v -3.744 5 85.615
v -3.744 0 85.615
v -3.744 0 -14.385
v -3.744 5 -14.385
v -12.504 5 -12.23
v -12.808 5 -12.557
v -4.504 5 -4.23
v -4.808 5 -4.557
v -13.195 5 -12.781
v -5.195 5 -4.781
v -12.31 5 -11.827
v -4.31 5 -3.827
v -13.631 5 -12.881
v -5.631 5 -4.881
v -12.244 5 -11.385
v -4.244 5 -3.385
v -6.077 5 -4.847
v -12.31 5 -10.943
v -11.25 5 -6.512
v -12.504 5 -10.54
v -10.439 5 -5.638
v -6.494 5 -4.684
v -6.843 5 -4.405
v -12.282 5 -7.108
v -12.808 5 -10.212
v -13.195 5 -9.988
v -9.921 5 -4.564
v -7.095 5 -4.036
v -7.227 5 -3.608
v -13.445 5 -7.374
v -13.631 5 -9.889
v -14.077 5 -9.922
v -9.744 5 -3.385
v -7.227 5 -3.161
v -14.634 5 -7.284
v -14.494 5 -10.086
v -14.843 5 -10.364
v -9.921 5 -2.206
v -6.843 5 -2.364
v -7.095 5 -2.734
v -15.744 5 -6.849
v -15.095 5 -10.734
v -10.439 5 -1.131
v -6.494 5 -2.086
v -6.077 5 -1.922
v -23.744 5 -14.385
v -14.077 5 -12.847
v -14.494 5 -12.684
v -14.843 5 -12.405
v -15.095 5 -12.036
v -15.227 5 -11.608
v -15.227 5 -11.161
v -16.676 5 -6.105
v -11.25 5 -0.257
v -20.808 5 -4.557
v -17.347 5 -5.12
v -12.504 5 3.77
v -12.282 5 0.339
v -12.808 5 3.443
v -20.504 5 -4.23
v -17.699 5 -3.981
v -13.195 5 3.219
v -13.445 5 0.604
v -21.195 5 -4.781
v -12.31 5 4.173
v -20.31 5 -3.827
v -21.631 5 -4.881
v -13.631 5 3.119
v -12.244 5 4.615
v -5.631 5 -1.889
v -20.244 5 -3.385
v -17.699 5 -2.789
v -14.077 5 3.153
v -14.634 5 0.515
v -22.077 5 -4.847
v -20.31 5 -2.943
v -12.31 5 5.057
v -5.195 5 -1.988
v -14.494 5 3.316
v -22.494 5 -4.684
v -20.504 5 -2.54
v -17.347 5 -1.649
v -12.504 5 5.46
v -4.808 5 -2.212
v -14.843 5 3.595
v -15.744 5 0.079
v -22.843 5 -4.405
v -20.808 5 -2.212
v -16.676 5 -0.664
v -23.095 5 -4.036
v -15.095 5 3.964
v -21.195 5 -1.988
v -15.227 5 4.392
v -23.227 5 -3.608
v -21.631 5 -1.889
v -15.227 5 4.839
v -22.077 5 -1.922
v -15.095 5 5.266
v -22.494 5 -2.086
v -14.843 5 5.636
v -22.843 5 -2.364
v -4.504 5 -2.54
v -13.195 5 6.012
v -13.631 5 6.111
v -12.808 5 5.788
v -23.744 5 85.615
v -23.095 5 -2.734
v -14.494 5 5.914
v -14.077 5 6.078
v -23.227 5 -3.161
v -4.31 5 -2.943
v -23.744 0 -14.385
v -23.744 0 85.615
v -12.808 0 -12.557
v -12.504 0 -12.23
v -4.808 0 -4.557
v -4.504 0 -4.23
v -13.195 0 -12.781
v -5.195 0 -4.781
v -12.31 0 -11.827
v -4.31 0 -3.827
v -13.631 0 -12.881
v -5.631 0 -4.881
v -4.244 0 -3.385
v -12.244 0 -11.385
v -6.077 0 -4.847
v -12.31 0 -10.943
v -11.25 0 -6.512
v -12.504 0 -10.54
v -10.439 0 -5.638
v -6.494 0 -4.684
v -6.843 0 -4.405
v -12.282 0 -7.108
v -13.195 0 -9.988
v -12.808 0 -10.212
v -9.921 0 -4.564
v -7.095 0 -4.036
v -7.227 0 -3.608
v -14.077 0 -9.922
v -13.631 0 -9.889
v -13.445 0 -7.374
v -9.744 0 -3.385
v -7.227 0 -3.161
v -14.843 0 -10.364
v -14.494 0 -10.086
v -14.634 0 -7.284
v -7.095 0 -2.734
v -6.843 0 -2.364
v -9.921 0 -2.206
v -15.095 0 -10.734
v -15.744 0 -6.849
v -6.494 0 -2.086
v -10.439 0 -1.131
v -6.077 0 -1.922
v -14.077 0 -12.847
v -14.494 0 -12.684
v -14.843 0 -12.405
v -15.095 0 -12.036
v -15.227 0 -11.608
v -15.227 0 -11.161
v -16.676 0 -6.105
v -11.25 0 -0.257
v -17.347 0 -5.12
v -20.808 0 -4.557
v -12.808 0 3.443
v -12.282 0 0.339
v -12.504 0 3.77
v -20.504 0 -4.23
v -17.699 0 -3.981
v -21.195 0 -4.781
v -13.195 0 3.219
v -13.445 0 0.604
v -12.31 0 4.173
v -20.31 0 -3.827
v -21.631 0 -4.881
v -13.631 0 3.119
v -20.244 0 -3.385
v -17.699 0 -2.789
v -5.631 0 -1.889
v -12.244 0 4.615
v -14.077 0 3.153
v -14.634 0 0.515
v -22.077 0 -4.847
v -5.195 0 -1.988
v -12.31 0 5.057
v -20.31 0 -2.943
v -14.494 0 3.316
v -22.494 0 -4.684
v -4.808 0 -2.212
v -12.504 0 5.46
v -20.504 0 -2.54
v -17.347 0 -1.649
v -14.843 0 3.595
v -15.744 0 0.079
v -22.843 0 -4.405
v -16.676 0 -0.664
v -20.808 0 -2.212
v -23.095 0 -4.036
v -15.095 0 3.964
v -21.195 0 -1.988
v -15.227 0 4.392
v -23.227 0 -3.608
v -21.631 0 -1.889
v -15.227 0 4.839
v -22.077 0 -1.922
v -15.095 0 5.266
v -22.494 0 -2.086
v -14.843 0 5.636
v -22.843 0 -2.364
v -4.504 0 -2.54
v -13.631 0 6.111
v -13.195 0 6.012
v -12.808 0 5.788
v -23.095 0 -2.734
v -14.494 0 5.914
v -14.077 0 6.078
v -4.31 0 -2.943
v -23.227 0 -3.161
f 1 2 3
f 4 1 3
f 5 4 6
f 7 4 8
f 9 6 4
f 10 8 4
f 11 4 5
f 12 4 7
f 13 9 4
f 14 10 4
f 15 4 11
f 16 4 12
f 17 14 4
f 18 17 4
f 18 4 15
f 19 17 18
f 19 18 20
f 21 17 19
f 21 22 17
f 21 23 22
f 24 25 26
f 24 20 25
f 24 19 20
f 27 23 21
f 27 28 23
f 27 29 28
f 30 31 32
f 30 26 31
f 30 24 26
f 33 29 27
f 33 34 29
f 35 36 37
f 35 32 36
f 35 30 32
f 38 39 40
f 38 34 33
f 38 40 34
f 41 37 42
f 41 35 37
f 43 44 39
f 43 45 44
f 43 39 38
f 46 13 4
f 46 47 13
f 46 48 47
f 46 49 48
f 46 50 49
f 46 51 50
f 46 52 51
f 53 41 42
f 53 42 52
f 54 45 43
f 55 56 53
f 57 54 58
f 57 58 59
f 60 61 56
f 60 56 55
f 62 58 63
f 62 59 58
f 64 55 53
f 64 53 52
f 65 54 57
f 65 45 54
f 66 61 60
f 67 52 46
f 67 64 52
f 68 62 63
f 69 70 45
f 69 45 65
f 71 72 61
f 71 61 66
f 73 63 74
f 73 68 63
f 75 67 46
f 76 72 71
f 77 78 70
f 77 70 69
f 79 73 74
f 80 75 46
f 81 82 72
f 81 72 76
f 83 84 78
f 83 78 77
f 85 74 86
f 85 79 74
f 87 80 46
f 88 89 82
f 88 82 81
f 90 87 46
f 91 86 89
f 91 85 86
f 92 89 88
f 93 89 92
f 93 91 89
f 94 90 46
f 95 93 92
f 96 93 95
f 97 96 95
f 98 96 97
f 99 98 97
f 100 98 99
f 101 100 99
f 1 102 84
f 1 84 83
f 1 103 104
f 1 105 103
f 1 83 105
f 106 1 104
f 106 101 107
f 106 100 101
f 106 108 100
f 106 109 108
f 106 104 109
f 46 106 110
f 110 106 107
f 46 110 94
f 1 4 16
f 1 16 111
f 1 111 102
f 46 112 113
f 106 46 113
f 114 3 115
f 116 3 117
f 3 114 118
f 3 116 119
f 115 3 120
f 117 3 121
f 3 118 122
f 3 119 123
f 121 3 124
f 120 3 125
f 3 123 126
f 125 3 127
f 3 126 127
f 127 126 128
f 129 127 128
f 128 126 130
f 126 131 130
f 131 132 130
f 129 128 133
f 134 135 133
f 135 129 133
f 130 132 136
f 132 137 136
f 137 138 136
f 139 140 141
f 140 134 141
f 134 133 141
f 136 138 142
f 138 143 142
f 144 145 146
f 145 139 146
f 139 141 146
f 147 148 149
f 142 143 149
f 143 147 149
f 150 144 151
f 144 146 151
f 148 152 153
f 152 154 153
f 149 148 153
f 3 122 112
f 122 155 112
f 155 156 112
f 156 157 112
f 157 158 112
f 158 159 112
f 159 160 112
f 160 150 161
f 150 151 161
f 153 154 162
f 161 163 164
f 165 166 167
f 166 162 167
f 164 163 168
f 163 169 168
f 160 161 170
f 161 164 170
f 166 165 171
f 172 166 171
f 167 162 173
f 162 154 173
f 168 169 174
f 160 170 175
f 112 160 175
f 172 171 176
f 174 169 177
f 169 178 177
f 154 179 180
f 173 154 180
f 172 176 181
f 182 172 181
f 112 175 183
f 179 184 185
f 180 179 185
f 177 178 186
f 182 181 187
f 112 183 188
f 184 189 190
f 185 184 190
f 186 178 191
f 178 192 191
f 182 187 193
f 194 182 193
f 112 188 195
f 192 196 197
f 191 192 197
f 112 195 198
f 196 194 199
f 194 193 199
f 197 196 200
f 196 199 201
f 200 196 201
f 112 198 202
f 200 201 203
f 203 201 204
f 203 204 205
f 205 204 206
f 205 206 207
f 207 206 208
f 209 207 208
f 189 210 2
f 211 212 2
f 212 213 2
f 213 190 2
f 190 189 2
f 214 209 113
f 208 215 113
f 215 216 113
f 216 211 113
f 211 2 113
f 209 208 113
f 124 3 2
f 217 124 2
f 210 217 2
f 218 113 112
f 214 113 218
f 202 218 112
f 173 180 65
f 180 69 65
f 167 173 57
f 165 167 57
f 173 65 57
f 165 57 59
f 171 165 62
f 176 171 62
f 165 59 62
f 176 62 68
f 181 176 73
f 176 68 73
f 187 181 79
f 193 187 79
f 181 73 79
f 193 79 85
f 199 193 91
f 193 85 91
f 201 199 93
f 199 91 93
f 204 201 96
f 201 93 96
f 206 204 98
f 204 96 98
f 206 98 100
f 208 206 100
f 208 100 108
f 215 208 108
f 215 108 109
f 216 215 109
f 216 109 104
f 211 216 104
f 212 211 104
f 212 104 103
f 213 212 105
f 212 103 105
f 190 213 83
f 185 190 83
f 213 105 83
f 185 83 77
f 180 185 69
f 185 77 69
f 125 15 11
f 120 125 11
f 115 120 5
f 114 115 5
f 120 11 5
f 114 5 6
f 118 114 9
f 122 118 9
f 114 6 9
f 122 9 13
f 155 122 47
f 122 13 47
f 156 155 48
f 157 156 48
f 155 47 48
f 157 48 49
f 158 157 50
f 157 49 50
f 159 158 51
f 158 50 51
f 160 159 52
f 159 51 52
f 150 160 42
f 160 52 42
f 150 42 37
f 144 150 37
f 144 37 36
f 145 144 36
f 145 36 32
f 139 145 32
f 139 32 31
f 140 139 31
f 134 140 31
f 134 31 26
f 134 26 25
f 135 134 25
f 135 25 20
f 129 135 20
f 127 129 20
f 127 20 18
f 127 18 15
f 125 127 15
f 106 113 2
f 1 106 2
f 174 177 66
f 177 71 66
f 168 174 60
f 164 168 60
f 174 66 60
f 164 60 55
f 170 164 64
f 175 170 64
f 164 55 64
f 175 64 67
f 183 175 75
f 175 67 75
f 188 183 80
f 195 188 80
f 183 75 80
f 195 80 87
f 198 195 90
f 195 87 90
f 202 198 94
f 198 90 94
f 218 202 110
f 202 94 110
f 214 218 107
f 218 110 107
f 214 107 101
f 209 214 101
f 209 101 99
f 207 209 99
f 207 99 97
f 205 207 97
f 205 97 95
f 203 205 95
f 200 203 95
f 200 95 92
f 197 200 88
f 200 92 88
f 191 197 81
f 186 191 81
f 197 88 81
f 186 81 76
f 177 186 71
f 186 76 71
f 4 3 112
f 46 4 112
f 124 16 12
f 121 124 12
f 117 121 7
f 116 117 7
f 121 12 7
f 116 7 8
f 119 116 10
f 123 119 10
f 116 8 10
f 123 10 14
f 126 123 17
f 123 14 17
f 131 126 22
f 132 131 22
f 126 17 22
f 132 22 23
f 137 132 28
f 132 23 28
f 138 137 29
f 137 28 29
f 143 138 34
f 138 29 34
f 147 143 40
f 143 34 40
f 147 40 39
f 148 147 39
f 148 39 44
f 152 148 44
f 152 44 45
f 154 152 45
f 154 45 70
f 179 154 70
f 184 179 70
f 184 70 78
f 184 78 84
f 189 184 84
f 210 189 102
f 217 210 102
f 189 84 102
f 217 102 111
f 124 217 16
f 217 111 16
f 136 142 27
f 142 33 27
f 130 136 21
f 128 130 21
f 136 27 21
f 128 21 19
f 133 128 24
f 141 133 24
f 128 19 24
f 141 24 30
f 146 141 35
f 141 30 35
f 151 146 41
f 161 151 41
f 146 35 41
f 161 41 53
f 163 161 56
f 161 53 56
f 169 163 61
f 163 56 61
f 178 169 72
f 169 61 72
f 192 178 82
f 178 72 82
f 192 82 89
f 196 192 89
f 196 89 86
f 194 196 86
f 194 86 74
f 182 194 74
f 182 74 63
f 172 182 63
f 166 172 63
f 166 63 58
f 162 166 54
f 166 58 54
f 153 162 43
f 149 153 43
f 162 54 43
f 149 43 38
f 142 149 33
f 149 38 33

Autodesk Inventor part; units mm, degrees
ref_plane "YZ Plane" through (0, 0, 0) normal (1, 0, 0) x (0, 1, 0)
ref_plane "XZ Plane" through (0, 0, 0) normal (0, 1, 0) x (-1, 0, 0)
ref_plane "XY Plane" through (0, 0, 0) normal (0, 0, 1) x (1, 0, 0)
sketch "Esquisse1" plane through (0, 0, 0) normal (0, 1, 0) x (-1, 0, 0)
  line L0 (23.7435, 85.6153) -> (3.7435, 85.6153)
  line L1 (3.7435, 85.6153) -> (3.7435, -14.3847)
  line L2 (3.7435, -14.3847) -> (23.7435, -14.3847)
  line L3 (23.7435, -14.3847) -> (23.7435, 85.6153)
  point P0 (0, 0)
  dimension "d0" = 100
  dimension "d1" = 20
extrude "Extrusion1" add sketch "Esquisse1" along normal blind 5
sketch "Esquisse2" plane through (0, 5, 0) normal (0, 1, 0) x (1, 0, 0)
  circle A0 centre (-13.7435, 3.3847) radius 4
  line L0 (-3.7435, 14.3847) -> (-23.7435, 14.3847) projected
  line L1 (-3.7435, -85.6153) -> (-3.7435, 14.3847) projected
  circle A1 centre (-13.7435, 11.3847) radius 1.5
  circle A2 centre (-5.7435, 3.3847) radius 1.5
  circle A3 centre (-21.7435, 3.3847) radius 1.5
  line L2 (-23.7435, 14.3847) -> (-23.7435, -85.6153) projected
  circle A4 centre (-13.7435, -4.6153) radius 1.5
  point P0 (0, 0)
  dimension "d4" = 11
  dimension "d5" = 10
  dimension "d6" = 8
  dimension "d9" = 3
  dimension "d10" = 3
  dimension "d11" = 10
  dimension "d12" = 2
  dimension "d13" = 3
  dimension "d14" = 11
  dimension "d15" = 2
  dimension "d16" = 11
  dimension "d17" = 3
  dimension "d18" = 10
  dimension "d19" = 3
  dimension "d20" = 19
extrude "Extrusion2" cut sketch "Esquisse2" against normal through all
properties part number "bras-lanceur"
